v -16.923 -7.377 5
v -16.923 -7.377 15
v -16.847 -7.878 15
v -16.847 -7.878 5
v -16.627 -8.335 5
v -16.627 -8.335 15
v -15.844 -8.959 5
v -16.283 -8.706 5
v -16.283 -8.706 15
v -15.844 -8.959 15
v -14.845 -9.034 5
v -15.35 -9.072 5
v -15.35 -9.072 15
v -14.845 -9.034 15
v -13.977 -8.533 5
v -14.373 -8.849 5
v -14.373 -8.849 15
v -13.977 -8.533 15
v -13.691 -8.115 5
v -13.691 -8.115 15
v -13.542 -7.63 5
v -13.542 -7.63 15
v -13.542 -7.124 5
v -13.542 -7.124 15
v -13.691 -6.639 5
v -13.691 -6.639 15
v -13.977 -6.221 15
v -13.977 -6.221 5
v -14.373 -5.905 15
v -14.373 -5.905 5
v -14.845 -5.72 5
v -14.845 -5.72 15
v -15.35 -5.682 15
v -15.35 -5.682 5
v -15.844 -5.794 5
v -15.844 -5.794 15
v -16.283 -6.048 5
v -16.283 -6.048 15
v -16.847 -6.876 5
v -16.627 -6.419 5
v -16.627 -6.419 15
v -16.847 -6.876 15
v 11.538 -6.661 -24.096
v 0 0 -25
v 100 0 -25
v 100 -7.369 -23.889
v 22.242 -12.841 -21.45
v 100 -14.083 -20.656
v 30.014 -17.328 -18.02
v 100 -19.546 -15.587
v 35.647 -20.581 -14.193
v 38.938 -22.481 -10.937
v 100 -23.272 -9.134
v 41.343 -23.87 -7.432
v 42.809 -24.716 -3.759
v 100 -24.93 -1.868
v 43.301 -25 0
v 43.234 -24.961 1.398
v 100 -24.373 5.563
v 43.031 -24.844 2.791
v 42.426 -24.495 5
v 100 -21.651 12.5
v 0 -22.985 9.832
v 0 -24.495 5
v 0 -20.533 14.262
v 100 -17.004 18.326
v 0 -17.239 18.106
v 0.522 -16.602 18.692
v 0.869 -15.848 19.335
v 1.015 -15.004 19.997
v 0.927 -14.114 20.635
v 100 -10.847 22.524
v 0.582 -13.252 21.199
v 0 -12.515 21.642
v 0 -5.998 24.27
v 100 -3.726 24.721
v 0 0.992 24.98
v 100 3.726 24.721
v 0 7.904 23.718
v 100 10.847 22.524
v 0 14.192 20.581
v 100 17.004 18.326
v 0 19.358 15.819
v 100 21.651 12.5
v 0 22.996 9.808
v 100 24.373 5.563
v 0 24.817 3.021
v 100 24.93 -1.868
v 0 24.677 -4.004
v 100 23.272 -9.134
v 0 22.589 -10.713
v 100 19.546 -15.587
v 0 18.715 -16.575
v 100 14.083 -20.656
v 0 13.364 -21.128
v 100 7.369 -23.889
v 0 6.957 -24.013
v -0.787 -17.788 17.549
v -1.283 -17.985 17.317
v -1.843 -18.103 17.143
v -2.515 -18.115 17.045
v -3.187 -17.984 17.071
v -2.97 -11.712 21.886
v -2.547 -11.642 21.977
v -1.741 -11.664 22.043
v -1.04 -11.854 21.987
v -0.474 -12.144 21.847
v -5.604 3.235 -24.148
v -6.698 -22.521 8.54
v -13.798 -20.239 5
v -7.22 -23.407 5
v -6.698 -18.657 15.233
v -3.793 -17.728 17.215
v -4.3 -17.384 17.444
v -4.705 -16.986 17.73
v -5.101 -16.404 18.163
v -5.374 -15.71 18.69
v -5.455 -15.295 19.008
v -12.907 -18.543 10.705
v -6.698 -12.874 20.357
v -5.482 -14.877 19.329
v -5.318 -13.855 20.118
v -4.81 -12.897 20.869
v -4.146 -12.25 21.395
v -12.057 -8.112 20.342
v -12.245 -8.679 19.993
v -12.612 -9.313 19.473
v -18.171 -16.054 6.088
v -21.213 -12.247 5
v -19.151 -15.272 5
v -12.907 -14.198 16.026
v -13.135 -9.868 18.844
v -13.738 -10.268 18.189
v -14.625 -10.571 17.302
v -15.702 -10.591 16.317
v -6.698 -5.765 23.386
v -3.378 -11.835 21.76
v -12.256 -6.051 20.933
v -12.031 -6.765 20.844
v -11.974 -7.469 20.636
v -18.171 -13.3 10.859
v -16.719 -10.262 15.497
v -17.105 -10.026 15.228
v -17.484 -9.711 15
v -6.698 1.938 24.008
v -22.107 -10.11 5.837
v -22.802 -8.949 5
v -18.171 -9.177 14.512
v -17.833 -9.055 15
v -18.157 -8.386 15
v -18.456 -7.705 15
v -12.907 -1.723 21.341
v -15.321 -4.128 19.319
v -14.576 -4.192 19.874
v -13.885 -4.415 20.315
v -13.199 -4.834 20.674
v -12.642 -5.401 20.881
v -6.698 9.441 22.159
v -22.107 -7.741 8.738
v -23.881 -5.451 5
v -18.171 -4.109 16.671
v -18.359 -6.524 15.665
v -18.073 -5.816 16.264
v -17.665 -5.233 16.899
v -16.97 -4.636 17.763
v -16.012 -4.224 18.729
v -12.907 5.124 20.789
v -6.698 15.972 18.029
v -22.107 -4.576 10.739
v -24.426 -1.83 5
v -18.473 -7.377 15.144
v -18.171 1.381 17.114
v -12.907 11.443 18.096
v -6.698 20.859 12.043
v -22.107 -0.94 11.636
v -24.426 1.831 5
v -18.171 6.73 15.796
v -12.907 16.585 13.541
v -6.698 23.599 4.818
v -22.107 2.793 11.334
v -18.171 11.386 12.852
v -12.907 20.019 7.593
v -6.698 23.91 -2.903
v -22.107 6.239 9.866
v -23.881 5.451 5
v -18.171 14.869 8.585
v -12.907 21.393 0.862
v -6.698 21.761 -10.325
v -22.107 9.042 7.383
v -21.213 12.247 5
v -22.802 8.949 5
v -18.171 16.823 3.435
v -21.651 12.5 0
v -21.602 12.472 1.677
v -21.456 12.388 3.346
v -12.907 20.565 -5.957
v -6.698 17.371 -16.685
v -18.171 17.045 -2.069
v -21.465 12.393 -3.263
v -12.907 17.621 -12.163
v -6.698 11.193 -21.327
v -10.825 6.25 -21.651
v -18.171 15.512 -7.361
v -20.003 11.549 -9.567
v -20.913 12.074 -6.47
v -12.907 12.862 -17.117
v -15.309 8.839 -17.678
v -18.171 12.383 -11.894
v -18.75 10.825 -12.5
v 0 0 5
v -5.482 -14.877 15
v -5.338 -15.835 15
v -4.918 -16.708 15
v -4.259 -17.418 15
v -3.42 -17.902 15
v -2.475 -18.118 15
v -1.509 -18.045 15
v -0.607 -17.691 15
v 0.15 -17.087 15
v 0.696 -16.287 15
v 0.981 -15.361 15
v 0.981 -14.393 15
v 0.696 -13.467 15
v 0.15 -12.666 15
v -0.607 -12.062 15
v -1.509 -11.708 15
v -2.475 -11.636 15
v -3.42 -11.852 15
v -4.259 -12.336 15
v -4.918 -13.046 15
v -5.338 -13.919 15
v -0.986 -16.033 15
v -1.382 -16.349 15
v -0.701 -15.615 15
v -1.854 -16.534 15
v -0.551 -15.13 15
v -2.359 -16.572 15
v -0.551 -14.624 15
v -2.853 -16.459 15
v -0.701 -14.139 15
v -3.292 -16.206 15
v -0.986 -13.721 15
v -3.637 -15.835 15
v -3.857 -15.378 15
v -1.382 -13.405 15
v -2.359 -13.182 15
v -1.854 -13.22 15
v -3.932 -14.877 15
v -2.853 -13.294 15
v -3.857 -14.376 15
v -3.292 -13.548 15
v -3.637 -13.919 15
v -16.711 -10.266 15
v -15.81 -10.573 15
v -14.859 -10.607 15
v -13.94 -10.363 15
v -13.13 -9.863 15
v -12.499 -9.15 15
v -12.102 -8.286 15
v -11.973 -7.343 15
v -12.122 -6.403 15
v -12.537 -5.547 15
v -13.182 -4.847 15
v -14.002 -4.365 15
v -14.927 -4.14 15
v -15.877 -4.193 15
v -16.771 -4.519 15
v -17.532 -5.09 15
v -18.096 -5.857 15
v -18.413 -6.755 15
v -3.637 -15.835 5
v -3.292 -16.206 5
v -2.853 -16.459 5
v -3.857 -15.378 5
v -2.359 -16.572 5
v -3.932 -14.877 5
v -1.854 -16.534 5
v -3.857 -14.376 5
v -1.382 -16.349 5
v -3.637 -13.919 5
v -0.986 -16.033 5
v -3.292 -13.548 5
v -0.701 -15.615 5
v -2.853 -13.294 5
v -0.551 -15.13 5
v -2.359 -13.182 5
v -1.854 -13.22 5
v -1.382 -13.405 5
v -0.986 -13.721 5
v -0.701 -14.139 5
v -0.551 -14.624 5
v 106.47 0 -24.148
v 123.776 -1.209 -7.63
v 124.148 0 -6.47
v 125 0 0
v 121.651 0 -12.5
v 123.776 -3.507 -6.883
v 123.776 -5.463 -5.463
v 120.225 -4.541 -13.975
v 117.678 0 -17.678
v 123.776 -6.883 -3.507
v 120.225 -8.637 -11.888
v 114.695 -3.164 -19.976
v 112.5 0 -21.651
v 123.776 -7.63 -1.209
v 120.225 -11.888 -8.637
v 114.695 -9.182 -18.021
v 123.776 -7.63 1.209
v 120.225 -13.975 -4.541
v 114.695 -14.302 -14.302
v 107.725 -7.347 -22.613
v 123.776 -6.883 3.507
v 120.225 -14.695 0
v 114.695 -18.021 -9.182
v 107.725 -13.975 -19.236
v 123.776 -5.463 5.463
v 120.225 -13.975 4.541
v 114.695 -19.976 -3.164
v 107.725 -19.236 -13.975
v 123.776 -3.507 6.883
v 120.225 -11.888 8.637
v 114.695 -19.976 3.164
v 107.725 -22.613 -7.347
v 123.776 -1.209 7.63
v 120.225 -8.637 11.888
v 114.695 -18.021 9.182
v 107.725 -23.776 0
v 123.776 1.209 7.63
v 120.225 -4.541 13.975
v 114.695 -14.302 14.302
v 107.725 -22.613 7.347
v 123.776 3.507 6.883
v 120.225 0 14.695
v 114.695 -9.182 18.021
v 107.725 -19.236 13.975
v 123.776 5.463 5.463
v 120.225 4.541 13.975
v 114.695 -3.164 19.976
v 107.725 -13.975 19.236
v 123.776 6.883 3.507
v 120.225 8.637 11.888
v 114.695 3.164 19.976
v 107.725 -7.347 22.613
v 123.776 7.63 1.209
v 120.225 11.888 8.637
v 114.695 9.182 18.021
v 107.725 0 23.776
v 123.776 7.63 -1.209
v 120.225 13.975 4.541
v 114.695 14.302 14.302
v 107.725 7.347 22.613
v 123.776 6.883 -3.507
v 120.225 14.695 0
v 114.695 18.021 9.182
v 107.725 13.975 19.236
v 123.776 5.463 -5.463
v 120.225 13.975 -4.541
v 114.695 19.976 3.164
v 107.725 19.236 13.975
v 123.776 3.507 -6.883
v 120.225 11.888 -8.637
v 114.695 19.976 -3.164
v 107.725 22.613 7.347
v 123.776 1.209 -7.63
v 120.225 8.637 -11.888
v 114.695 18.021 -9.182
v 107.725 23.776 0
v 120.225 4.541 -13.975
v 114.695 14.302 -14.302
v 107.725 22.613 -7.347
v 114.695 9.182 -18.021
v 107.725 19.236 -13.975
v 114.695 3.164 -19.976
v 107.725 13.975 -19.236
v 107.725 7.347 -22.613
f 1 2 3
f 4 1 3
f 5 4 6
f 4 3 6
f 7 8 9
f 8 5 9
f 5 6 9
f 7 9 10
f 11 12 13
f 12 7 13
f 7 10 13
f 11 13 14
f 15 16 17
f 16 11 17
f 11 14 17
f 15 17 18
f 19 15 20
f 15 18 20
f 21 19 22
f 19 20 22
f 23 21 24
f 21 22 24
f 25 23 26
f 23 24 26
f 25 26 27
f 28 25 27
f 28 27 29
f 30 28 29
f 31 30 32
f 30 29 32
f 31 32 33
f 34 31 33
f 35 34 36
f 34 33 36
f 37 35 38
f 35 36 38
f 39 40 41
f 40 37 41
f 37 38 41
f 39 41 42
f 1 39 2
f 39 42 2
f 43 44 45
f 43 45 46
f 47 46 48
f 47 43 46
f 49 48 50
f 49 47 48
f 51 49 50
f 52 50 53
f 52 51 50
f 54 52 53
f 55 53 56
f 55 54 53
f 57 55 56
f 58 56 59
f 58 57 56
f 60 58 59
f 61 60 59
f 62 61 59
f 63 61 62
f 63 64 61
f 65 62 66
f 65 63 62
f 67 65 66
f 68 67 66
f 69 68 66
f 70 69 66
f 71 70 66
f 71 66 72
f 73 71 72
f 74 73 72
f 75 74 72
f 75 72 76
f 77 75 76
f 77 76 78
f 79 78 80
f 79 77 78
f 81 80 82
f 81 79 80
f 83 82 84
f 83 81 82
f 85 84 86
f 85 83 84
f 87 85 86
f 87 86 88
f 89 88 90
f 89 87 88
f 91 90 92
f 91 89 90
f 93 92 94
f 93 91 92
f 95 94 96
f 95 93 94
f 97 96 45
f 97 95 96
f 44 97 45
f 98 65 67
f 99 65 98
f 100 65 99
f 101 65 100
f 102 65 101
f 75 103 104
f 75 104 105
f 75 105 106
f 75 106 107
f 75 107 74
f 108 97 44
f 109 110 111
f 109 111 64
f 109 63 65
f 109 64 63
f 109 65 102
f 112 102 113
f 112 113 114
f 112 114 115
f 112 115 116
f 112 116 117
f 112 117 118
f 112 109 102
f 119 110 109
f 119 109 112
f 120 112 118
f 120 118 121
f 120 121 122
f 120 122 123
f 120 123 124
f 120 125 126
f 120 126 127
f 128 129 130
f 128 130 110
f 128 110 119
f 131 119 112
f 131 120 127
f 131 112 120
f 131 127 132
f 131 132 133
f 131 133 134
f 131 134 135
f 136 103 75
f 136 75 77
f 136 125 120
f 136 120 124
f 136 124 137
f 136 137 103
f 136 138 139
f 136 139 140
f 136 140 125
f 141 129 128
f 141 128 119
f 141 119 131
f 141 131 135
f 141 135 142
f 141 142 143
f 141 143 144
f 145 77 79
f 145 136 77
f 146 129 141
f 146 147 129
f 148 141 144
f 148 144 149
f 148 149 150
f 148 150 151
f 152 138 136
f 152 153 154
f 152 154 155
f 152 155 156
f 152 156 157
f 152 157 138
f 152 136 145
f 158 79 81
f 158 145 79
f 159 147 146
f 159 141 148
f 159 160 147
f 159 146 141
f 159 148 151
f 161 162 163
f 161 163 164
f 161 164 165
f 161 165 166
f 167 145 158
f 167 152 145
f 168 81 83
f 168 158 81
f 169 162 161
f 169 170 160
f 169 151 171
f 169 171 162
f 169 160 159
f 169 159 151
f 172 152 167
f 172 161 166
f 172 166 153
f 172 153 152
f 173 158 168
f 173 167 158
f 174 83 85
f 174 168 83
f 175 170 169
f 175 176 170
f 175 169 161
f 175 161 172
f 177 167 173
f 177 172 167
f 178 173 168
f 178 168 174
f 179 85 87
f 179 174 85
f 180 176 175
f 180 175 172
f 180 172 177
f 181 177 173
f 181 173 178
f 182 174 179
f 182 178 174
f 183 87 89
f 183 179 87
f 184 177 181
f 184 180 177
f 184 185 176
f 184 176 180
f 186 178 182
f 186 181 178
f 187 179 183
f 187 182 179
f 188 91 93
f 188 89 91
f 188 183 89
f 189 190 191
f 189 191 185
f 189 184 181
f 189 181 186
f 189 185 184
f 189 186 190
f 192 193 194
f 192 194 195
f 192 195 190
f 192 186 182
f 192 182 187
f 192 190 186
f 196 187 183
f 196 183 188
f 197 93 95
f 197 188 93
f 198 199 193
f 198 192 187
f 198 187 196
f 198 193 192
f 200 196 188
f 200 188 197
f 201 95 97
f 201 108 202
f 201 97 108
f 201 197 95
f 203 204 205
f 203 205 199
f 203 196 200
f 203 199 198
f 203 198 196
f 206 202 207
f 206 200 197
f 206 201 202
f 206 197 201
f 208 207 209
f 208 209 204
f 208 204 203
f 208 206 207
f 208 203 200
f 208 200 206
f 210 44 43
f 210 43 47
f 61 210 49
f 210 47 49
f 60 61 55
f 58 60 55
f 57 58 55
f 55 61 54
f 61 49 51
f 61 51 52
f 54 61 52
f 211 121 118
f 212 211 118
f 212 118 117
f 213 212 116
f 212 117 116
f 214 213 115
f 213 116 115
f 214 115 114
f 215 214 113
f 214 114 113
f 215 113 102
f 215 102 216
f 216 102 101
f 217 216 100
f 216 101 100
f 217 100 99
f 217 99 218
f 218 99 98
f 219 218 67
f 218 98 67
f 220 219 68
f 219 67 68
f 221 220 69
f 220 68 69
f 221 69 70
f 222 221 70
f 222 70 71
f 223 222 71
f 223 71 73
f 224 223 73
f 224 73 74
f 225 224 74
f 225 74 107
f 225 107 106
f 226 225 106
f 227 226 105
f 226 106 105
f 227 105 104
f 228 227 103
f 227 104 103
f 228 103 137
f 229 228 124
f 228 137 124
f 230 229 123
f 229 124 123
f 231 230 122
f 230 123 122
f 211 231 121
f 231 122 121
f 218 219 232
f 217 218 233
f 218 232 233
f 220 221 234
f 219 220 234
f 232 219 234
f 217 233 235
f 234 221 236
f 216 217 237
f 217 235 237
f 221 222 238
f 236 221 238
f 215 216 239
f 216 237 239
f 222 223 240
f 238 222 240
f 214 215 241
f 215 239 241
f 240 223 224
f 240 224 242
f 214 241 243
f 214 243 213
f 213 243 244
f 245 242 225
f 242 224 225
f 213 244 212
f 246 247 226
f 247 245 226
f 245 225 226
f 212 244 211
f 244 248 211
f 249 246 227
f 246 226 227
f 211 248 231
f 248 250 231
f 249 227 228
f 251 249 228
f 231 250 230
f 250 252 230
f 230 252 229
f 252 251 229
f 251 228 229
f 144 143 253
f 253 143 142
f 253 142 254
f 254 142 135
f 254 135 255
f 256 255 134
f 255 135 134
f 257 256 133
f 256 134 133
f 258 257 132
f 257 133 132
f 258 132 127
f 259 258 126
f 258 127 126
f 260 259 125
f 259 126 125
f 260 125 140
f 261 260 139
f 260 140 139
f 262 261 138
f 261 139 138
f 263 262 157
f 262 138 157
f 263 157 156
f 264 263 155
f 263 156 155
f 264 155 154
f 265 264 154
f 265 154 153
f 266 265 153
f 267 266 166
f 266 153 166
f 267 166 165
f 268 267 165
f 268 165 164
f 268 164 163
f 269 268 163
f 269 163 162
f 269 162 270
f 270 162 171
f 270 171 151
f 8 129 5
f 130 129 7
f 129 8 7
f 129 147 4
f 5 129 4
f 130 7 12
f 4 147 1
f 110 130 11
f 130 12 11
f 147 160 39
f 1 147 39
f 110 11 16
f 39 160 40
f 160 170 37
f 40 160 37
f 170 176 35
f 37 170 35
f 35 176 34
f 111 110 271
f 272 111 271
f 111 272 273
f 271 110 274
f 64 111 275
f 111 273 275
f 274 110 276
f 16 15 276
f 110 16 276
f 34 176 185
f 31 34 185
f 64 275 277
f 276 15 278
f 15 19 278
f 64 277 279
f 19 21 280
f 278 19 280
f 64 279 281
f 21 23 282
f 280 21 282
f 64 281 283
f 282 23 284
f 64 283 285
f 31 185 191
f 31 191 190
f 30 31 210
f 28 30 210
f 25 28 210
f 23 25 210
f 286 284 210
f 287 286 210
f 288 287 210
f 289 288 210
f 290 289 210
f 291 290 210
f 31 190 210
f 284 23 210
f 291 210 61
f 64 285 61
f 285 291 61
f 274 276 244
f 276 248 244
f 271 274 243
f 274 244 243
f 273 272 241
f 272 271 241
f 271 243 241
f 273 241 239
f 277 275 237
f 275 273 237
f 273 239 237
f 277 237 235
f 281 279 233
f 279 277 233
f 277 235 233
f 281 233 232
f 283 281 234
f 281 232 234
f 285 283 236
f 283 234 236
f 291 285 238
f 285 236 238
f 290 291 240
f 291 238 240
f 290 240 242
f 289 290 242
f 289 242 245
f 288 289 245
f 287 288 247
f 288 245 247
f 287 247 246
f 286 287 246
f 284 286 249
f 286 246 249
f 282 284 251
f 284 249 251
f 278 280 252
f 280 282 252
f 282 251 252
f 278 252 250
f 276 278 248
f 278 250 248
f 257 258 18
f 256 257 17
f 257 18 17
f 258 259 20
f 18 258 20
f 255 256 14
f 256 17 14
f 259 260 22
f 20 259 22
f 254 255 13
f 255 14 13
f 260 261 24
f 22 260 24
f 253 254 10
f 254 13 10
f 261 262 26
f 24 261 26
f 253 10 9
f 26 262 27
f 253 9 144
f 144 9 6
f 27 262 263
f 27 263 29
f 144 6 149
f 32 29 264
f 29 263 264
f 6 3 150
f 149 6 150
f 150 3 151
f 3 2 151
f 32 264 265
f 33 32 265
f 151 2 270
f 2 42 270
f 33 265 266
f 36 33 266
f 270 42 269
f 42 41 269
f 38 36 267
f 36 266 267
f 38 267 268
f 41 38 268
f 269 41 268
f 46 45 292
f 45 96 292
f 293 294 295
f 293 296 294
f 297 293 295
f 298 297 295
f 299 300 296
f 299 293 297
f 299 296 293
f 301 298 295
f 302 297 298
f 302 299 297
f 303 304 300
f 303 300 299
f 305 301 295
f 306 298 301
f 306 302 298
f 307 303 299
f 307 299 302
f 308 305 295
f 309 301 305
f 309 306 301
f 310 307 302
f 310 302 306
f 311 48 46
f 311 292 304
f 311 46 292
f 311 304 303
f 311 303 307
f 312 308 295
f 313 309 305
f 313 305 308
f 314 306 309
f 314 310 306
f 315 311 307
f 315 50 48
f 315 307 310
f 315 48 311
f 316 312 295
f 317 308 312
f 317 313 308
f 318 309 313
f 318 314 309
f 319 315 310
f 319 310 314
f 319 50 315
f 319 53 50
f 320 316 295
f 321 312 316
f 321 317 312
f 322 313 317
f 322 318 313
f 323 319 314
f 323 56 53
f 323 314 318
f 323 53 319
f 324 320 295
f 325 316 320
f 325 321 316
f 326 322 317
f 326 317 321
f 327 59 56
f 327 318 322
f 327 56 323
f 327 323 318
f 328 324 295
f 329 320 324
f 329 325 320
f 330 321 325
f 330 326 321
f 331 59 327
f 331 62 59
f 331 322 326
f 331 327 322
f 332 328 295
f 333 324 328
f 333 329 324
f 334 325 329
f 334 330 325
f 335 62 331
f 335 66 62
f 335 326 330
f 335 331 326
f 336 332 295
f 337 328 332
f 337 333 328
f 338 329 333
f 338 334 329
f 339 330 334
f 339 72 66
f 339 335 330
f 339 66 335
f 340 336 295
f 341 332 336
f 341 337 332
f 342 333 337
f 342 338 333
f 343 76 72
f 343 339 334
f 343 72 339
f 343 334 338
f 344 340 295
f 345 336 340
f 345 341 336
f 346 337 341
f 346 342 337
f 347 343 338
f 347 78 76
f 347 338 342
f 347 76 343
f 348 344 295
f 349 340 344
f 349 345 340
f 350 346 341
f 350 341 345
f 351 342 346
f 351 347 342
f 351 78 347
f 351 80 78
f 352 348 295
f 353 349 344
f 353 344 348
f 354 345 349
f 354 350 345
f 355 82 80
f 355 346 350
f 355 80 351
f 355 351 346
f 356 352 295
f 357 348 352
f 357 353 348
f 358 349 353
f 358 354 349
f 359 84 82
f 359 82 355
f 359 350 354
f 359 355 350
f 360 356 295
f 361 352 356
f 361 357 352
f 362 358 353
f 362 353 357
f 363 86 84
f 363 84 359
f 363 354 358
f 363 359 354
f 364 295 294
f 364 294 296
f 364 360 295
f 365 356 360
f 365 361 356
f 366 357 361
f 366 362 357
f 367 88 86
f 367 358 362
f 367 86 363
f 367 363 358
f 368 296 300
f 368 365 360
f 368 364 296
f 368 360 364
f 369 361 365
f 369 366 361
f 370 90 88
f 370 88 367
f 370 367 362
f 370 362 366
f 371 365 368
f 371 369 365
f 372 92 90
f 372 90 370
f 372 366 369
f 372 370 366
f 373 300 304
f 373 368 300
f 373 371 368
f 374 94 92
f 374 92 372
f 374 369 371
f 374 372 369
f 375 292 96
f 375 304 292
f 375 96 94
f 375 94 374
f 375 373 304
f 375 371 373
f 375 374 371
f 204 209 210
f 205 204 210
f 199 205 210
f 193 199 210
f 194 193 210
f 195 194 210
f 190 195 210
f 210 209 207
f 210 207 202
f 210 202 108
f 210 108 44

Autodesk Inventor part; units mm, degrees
ref_plane "YZ Plane" through (0, 0, 0) normal (1, 0, 0) x (0, 1, 0)
sketch "Esquisse1" plane through (0, 0, 0) normal (0, 1, 0) x (-1, 0, 0)
  line L0 (0, 0) -> (-100, 0)
  line L1 (-100, 0) -> (-100, -25)
  line L2 (-100, -25) -> (0, -25)
  line L3 (0, -25) -> (0, 0)
  arc A0 (0, -25) -> (25, 0) centre (0, 0) ccw
  line L4 (25, 0) -> (0, 0)
  line L5 (0, 0) -> (0, -25)
  line L6 (-100, 0) -> (-100, -25)
  arc A1 (-125, 0) -> (-100, -25) centre (-100, 0) ccw
  line L7 (-100, 0) -> (-125, 0)
  dimension "d1" = 25
  dimension "d2" = 100
revolve "Révolution1" add sketch "Esquisse1" angle 360 about axis through (0, 0, 0) along (1, 0, 0)
ref_plane "Plan de construction1" through (50, 0, -25) normal (0, 0, 1) x (1, 0, 0)
sketch "Esquisse2" plane through (50, 0, -25) normal (0, 0, 1) x (1, 0, 0)
  arc A0 (-50, 25) -> (-50, -25) centre (-50, 0) ccw projected
  line L0 (-50, 0) -> (-62.5, -21.6506)
  line L1 (-62.5, -21.6506) -> (-84.1506, -9.1506)
  line L2 (-84.1506, -9.1506) -> (-71.6506, 12.5)
  line L3 (-71.6506, 12.5) -> (-50, 0)
  line L4 (-50, 0) -> (-17.1432, 0)
  line L5 (-50, 0) -> (-6.6987, -25)
  line L6 (-6.6987, -25) -> (-19.1987, -46.6506)
  line L7 (-19.1987, -46.6506) -> (-62.5, -21.6506)
  line L8 (-62.5, -21.6506) -> (-50, 0)
  line L9 (-50, -25) -> (-50, 25) construction
  line L10 (-50, -25) -> (100.3384, -25) construction
  dimension "d8" = 120
extrude "Extrusion1" cut sketch "Esquisse2" along normal blind 30
ref_plane "Plan de construction2" through (50, 0, 35) normal (0, 0, -1) x (-1, 0, 0)
sketch "Esquisse3" plane through (50, 0, 35) normal (0, 0, -1) x (-1, 0, 0)
  line L0 (65.2228, -7.3769) -> (52.2324, -14.8769) construction
  circle A0 centre (52.2324, -14.8769) radius 1.7
  circle A1 centre (65.2228, -7.3769) radius 1.7
  line L1 (71.2132, 12.2474) -> (50, 0) construction
  line L2 (71.2132, 12.2474) -> (-7.2, -33.0245) construction
  line L3 (71.2132, 12.2474) -> (83.9867, -9.8769) construction
  dimension "d15" = 3.4
  dimension "d16" = 3.4
  dimension "d23" = 14
  dimension "d24" = 15
  dimension "d25" = 30
extrude "Extrusion2" cut sketch "Esquisse3" along normal blind 30
sketch "Esquisse4" plane through (50, 0, 35) normal (0, 0, -1) x (-1, 0, 0)
  circle A0 centre (65.2228, -7.3769) radius 1.7 projected
  circle A1 centre (65.2228, -7.3769) radius 3.25
  circle A2 centre (52.2324, -14.8769) radius 1.7 projected
  circle A3 centre (52.2324, -14.8769) radius 3.25
  point P0 (50, 0)
  dimension "d19" = 6.5
  dimension "d20" = 6.5
extrude "Extrusion3" cut sketch "Esquisse4" along normal blind 20
equation "\"d16\" = d15"
equation "\"d20\" = d19"
properties part number "P1704_002_mainDroite"
